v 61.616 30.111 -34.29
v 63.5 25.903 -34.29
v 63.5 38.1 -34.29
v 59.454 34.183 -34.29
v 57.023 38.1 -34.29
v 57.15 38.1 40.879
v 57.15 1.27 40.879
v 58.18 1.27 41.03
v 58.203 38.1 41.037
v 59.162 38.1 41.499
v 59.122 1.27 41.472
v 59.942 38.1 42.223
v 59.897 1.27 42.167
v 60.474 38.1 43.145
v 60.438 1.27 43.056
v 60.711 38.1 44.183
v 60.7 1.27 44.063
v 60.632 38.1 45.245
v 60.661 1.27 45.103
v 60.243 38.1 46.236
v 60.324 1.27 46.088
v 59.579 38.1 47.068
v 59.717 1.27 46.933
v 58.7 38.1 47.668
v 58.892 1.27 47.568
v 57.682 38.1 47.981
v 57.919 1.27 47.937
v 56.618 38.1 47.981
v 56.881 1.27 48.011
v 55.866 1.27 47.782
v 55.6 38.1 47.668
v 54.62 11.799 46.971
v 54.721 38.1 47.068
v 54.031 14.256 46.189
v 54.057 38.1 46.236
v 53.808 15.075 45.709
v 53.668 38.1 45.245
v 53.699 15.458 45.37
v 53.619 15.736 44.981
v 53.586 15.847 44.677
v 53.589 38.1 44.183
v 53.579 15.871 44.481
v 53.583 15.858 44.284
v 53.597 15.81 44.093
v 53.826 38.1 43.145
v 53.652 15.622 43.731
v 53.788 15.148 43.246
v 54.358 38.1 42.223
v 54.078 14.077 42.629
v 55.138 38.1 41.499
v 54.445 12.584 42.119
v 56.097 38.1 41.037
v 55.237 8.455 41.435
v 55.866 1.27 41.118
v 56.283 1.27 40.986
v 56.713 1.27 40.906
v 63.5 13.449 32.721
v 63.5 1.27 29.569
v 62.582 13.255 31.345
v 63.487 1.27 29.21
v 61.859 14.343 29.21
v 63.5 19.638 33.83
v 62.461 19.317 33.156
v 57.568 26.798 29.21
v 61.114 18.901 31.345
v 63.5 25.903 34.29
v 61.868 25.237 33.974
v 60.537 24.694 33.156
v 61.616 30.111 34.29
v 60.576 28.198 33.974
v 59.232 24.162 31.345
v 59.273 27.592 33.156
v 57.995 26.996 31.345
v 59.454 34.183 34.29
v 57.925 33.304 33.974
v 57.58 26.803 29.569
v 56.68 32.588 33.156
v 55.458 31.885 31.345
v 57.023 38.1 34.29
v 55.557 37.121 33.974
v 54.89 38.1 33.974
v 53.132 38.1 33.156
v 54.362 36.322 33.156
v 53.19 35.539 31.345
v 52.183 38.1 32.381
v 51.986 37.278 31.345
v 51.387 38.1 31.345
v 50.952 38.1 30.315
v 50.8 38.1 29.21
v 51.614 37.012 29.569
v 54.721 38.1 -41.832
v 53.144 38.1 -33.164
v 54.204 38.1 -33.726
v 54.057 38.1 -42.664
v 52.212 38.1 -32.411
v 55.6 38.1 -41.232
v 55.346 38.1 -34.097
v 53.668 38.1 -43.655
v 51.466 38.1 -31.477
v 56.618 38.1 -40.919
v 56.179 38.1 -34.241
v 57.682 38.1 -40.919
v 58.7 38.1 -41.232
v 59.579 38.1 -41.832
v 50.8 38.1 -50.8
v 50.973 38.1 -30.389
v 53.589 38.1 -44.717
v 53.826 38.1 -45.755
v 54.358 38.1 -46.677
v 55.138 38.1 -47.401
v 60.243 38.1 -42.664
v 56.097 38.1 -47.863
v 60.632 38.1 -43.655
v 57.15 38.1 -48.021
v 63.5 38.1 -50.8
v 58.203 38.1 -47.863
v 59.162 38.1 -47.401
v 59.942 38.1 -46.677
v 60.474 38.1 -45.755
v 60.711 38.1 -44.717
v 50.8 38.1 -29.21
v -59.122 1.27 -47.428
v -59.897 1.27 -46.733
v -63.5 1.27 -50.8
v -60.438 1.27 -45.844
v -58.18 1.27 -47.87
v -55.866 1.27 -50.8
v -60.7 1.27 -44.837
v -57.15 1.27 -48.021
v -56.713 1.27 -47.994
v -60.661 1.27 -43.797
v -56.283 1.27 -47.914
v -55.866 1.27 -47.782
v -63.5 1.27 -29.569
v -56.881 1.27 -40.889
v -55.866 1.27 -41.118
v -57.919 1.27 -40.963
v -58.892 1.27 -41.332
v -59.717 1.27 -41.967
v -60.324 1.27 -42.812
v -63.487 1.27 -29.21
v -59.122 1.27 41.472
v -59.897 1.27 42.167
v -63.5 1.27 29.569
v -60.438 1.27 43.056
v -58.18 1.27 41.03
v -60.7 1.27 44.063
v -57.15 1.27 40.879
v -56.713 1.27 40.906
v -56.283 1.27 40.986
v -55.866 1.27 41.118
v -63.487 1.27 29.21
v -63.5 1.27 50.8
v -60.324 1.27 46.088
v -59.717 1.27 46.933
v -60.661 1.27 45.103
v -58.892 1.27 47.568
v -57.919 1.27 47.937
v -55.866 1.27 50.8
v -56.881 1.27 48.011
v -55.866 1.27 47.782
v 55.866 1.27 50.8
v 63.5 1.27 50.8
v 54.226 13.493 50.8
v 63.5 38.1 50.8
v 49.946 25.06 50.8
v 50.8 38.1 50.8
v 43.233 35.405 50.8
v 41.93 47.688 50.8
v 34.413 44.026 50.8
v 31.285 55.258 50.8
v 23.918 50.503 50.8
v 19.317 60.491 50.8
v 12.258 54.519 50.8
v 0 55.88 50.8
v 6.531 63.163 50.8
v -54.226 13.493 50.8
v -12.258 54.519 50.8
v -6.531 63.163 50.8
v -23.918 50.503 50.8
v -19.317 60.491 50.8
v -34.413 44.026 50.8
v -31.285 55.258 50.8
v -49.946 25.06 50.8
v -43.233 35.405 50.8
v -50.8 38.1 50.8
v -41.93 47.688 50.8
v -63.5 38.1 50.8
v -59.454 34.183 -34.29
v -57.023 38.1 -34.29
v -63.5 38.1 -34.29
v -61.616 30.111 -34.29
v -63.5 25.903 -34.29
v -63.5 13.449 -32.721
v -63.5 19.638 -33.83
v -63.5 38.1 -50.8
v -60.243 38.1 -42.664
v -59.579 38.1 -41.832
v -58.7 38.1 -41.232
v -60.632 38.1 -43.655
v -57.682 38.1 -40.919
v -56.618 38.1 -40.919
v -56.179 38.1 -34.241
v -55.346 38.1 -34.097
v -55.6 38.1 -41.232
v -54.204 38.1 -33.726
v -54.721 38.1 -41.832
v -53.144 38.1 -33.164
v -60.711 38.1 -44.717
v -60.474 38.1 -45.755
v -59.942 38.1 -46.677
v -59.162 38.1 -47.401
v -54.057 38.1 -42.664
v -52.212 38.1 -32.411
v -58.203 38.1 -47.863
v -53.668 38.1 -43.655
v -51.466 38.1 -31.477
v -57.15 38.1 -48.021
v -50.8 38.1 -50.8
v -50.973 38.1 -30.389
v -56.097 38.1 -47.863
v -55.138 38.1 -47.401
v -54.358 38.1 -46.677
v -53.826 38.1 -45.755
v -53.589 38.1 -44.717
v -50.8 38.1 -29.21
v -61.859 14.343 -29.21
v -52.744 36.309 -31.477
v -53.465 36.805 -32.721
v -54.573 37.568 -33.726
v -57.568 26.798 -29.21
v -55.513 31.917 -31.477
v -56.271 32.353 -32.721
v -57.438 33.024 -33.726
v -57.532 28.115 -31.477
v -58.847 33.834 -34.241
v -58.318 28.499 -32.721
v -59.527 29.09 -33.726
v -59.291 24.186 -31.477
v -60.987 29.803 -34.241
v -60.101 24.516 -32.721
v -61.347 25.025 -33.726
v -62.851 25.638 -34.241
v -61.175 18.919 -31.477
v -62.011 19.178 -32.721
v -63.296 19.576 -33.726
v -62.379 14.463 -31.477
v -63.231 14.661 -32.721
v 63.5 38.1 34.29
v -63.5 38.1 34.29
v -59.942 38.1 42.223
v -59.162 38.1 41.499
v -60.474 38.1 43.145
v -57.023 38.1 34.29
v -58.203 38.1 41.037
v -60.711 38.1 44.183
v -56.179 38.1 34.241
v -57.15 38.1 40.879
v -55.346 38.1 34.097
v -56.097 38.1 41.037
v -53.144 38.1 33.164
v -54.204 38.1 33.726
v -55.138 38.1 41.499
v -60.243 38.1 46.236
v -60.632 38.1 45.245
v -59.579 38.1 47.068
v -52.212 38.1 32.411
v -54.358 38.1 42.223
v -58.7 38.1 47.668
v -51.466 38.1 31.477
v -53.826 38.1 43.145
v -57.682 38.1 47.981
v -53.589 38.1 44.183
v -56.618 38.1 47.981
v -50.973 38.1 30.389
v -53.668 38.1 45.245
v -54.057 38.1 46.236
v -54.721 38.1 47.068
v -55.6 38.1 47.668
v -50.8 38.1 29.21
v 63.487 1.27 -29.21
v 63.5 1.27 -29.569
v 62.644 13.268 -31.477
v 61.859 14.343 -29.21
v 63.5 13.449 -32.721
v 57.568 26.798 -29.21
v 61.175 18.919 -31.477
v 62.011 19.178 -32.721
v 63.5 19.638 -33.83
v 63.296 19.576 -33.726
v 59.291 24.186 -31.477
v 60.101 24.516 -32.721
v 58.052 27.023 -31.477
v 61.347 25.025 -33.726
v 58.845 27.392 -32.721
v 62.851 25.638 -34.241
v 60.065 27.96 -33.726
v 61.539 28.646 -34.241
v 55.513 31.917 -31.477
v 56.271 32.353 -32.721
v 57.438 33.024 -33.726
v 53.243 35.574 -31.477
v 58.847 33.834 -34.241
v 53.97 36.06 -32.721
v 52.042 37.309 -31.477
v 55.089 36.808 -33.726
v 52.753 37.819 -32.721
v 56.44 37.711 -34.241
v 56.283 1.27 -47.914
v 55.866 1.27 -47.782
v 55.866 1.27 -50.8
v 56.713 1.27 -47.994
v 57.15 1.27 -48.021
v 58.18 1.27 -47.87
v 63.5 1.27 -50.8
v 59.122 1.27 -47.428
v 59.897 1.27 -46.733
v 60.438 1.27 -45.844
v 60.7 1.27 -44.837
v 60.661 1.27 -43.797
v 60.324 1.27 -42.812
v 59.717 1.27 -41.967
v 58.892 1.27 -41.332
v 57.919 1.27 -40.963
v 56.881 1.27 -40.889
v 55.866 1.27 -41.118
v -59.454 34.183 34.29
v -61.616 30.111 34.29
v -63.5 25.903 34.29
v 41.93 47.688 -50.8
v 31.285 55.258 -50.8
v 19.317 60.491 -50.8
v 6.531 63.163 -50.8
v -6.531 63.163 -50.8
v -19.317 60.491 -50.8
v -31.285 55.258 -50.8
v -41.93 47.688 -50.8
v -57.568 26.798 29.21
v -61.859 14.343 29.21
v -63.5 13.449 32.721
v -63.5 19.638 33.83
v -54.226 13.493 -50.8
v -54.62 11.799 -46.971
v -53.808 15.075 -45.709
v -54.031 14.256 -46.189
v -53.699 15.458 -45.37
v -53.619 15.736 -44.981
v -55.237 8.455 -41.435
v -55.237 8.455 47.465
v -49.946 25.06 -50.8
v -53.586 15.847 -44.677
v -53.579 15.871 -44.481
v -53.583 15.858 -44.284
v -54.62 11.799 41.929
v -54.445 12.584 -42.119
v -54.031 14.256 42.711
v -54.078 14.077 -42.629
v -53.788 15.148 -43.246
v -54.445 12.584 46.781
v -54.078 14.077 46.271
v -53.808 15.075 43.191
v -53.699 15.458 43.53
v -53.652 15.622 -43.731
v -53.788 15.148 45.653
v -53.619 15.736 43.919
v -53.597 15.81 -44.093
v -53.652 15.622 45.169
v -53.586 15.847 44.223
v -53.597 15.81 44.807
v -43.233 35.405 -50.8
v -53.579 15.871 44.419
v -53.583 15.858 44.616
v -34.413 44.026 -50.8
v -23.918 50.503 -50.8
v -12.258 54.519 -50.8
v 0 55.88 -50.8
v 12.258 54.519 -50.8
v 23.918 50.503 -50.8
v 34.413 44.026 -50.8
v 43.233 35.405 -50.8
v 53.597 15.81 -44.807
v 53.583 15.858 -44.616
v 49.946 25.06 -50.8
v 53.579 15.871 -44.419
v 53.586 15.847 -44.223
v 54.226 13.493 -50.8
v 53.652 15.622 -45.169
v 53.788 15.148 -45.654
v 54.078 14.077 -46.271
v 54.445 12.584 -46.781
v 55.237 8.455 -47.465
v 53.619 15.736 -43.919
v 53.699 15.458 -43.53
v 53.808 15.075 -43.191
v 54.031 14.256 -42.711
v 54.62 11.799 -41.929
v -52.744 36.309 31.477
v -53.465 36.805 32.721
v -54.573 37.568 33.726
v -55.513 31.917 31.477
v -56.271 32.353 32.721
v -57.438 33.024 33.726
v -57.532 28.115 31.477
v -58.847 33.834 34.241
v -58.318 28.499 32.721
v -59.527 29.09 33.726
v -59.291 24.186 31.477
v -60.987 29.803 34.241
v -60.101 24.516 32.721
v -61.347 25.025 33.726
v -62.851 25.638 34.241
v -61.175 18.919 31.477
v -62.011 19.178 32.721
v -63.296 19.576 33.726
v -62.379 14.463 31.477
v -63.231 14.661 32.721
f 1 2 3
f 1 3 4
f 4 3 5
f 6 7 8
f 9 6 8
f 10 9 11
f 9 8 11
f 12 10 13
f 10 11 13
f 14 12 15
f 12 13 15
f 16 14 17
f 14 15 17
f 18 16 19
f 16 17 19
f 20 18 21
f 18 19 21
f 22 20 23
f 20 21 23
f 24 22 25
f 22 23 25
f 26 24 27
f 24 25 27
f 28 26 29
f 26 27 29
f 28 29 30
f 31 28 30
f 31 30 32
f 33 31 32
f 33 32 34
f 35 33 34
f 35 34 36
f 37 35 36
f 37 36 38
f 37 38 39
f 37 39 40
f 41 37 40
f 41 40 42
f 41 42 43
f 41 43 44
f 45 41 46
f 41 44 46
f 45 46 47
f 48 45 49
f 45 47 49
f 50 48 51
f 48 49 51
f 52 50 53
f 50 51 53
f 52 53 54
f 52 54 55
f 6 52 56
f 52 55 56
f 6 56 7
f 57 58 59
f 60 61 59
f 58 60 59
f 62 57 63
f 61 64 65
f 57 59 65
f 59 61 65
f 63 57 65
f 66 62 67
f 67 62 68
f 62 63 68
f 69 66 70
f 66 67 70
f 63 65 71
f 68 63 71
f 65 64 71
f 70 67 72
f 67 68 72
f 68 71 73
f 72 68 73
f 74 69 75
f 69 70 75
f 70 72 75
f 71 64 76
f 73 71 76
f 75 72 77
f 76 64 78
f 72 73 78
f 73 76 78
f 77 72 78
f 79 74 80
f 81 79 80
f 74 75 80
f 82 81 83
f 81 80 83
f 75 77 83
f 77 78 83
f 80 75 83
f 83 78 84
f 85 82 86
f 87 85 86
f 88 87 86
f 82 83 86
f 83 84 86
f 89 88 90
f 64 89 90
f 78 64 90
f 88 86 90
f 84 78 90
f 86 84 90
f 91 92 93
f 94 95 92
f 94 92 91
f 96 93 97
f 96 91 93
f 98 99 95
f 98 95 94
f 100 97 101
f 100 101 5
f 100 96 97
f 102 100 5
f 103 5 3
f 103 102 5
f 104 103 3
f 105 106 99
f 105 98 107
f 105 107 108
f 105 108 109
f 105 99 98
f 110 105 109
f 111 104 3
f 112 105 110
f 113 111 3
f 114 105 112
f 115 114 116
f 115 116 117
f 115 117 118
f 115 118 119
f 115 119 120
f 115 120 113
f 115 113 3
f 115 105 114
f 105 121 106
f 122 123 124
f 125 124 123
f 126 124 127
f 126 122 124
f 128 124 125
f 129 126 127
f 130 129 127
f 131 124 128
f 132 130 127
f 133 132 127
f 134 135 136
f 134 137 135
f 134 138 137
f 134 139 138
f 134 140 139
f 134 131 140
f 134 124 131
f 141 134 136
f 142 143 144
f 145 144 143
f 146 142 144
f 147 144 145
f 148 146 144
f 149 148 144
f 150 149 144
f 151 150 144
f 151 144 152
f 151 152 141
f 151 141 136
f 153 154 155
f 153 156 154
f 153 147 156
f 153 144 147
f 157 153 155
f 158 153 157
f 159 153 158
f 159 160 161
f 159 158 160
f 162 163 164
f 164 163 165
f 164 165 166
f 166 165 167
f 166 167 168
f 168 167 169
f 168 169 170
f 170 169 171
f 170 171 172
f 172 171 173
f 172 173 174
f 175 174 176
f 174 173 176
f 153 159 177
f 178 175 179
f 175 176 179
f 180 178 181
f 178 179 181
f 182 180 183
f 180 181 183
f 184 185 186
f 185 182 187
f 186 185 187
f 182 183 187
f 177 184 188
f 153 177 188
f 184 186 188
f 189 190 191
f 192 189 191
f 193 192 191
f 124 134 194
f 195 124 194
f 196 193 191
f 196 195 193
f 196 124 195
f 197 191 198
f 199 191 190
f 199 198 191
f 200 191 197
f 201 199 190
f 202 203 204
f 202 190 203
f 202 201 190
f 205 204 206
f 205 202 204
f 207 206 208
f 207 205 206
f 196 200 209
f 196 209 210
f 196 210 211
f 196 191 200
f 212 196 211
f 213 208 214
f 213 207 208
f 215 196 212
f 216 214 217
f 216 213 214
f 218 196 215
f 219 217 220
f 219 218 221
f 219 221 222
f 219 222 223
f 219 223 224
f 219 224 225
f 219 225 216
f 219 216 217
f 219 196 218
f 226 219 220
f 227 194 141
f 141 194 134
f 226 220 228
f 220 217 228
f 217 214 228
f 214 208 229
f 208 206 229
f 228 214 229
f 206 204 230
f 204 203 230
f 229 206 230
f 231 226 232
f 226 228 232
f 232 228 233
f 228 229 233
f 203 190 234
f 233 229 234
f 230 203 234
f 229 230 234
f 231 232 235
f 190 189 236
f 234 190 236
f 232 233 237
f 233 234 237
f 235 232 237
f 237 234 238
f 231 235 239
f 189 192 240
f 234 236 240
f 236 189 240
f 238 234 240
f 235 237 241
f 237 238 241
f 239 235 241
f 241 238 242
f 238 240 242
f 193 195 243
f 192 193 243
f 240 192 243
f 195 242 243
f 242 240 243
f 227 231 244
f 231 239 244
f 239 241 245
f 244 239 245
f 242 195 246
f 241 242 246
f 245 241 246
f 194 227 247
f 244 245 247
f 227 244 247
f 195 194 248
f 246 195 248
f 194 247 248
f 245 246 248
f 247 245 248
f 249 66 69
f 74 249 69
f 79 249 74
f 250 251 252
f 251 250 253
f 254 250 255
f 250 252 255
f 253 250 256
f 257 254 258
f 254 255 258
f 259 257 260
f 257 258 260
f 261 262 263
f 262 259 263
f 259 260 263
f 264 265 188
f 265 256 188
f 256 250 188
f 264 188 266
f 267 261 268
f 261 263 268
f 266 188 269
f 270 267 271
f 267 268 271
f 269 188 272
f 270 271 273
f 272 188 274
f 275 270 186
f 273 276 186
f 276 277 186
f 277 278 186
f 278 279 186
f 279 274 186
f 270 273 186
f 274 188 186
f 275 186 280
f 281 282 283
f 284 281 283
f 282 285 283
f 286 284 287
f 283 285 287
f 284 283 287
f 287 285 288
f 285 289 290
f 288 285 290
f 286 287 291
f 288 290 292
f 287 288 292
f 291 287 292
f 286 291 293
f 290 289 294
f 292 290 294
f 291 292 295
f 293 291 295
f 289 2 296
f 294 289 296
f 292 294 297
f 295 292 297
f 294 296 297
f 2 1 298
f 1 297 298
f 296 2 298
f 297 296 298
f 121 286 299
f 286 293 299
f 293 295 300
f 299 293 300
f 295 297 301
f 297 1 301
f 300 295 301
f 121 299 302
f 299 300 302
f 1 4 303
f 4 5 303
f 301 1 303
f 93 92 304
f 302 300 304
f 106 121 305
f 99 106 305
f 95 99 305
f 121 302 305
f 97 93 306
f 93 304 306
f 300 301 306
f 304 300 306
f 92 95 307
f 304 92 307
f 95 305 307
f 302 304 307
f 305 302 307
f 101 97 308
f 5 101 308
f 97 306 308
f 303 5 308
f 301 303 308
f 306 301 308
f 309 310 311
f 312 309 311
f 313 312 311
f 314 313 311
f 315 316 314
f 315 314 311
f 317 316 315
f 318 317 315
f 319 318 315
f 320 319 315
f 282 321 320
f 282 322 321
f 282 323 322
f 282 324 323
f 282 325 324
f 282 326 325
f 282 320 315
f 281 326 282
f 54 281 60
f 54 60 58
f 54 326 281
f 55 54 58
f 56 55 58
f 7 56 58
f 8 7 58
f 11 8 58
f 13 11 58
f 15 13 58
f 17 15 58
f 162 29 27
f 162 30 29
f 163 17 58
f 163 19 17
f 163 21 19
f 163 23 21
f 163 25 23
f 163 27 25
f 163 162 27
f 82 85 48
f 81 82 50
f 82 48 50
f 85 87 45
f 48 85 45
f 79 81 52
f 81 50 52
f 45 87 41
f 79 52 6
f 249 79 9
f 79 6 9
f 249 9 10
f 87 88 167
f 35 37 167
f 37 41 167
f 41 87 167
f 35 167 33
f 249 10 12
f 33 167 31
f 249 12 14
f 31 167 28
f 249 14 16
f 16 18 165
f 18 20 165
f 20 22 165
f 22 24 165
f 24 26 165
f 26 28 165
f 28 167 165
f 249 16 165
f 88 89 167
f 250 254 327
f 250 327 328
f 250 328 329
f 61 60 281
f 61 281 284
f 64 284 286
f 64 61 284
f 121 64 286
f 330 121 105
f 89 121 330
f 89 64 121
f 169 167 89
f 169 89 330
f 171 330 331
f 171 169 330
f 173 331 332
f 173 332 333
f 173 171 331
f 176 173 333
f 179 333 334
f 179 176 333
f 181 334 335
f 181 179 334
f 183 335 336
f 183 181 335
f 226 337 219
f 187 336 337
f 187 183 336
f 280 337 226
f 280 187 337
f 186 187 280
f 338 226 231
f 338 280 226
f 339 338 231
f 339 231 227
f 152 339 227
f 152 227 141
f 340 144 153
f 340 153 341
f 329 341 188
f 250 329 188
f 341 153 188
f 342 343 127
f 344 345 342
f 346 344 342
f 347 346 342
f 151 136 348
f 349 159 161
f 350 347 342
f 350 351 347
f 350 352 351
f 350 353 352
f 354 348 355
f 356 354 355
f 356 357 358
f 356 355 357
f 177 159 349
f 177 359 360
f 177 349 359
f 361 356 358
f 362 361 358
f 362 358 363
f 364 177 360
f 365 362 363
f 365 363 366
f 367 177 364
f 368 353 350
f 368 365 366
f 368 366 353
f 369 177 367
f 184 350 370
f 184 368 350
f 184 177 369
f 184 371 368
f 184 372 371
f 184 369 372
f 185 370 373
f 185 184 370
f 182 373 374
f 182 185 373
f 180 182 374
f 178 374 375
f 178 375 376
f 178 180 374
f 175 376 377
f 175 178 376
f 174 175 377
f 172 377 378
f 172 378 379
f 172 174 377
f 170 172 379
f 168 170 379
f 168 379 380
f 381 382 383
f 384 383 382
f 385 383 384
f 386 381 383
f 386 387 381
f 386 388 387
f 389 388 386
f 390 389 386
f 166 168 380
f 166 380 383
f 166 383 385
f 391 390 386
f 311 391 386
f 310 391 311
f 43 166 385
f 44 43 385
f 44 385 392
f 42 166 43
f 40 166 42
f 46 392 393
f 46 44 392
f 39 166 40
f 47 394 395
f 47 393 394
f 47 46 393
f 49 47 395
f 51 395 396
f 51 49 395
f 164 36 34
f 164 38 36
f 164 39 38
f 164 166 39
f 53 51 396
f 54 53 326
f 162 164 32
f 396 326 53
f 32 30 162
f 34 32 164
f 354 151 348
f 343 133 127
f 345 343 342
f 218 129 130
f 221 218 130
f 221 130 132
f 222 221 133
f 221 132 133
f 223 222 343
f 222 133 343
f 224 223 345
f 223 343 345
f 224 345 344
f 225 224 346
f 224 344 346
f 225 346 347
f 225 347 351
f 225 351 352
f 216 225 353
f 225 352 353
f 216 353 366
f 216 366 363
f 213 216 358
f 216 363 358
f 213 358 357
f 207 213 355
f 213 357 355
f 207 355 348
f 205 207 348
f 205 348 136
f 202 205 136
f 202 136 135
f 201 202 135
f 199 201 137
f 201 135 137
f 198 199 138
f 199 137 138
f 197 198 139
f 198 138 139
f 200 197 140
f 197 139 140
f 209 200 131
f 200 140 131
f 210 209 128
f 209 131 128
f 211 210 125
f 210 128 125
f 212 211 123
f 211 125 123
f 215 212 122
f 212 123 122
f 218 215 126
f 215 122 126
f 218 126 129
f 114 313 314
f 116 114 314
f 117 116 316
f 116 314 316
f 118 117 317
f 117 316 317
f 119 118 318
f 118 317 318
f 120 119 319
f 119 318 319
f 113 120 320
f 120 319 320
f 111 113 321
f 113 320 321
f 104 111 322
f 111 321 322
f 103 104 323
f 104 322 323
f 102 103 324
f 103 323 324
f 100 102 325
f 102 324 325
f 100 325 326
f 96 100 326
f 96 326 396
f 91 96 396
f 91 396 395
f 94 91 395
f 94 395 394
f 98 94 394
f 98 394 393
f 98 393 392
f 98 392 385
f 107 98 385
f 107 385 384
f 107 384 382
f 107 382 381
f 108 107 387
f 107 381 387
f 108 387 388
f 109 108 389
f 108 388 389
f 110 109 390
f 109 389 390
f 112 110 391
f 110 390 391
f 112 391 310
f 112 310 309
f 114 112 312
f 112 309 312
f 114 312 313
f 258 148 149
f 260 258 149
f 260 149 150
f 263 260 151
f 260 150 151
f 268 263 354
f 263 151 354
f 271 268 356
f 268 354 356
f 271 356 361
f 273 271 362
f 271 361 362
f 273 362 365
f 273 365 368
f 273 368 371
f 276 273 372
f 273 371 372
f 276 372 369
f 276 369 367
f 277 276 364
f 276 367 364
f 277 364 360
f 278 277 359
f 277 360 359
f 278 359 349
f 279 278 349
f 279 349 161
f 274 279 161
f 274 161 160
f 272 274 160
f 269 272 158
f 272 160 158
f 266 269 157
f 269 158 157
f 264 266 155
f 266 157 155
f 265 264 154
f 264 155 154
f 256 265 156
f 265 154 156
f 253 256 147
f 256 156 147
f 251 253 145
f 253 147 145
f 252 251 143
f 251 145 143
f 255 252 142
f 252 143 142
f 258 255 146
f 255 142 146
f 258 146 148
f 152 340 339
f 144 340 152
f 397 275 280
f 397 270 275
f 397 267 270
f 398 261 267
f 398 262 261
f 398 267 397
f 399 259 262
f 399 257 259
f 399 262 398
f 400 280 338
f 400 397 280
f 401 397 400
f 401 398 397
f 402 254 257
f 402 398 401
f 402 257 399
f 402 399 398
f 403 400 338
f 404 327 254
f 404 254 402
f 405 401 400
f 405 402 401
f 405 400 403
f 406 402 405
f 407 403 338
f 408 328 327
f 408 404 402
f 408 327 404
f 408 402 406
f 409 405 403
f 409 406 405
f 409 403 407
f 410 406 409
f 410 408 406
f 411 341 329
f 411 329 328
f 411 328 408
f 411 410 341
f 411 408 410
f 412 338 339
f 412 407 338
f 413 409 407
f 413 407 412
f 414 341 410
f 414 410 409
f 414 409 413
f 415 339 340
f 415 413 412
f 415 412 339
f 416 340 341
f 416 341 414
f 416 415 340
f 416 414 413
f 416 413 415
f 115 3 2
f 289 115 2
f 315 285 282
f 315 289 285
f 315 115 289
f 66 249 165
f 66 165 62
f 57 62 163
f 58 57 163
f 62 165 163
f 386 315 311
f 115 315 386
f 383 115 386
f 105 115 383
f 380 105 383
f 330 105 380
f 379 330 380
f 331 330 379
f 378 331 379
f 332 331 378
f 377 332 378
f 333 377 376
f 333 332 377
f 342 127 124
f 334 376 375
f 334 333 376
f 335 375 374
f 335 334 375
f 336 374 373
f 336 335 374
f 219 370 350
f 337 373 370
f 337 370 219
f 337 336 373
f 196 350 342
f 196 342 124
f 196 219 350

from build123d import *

# Parameters (mm, degrees)
BOSS_EXTRUDE1_DEPTH     = 50.8
BOSS_EXTRUDE2_DEPTH     = 16.51
SKETCH4_W               = 127
SKETCH4_H               = 1.27
CUT_EXTRUDE1_DEPTH      = 102.6
F_1_4_CLEARANCE_HOLE1_D = 7.14248
FILLET1_R               = 5.08


with BuildPart() as part:
    # Sketch1 → Boss-Extrude1 (new body, symmetric)
    with BuildSketch(Plane.XY):
        with BuildLine():
            Line((55.88, 0), (63.5, 0))
            ThreePointArc((63.5, 0), (0, 63.5), (-63.5, 0))
            Line((-63.5, 0), (-55.88, 0))
            ThreePointArc((-55.88, 0), (0, 55.88), (55.88, 0))
        make_face()
    extrude(amount=BOSS_EXTRUDE1_DEPTH, both=True)

    # Sketch2 → Boss-Extrude2 (add)
    with BuildSketch(Plane(origin=(0, 0, -50.8), x_dir=(-1, 0, 0), z_dir=(0, 0, -1))):
        with BuildLine():
            Line((-63.5, 38.1), (-63.5, 0))
            ThreePointArc((-63.5, 0), (-60.241389426, 20.080463142), (-50.8, 38.1))
            Line((-50.8, 38.1), (-63.5, 38.1))
        make_face()
        with BuildLine():
            Line((63.5, 38.1), (50.8, 38.1))
            ThreePointArc((50.8, 38.1), (60.241389426, 20.080463142), (63.5, 0))
            Line((63.5, 0), (63.5, 38.1))
        make_face()
    boss_extrude2 = extrude(amount=-BOSS_EXTRUDE2_DEPTH)

    # Mirror1: Boss-Extrude2 across plane
    add(boss_extrude2.mirror(Plane.XY))

    # Sketch4 → Cut-Extrude1 (cut, through all)
    with BuildSketch(Plane.XY.offset(50.8)):
        with Locations((0, 0.635)):
            Rectangle(SKETCH4_W, SKETCH4_H)
    extrude(amount=-CUT_EXTRUDE1_DEPTH, mode=Mode.SUBTRACT)

    # 1/4 Clearance Hole1 (through all)
    with Locations(Plane(origin=(-57.15, 38.1, -44.45), x_dir=(0, 0, 1), z_dir=(0, 1, 0))):
        with Locations((0, 0), (0, 114.3), (88.9, 0), (88.9, 114.3)):
            Hole(F_1_4_CLEARANCE_HOLE1_D / 2)

    # Fillet1
    fillet1_edges = [part.edges().sort_by_distance(p)[0] for p in [
        (60.037562307, 20.681903014, 34.29),
        (-60.037562307, 20.681903014, 34.29),
        (-60.037562307, 20.681903014, -34.29),
        (60.037562307, 20.681903014, -34.29),
    ]]
    fillet(fillet1_edges, radius=FILLET1_R)


solid = part.part
